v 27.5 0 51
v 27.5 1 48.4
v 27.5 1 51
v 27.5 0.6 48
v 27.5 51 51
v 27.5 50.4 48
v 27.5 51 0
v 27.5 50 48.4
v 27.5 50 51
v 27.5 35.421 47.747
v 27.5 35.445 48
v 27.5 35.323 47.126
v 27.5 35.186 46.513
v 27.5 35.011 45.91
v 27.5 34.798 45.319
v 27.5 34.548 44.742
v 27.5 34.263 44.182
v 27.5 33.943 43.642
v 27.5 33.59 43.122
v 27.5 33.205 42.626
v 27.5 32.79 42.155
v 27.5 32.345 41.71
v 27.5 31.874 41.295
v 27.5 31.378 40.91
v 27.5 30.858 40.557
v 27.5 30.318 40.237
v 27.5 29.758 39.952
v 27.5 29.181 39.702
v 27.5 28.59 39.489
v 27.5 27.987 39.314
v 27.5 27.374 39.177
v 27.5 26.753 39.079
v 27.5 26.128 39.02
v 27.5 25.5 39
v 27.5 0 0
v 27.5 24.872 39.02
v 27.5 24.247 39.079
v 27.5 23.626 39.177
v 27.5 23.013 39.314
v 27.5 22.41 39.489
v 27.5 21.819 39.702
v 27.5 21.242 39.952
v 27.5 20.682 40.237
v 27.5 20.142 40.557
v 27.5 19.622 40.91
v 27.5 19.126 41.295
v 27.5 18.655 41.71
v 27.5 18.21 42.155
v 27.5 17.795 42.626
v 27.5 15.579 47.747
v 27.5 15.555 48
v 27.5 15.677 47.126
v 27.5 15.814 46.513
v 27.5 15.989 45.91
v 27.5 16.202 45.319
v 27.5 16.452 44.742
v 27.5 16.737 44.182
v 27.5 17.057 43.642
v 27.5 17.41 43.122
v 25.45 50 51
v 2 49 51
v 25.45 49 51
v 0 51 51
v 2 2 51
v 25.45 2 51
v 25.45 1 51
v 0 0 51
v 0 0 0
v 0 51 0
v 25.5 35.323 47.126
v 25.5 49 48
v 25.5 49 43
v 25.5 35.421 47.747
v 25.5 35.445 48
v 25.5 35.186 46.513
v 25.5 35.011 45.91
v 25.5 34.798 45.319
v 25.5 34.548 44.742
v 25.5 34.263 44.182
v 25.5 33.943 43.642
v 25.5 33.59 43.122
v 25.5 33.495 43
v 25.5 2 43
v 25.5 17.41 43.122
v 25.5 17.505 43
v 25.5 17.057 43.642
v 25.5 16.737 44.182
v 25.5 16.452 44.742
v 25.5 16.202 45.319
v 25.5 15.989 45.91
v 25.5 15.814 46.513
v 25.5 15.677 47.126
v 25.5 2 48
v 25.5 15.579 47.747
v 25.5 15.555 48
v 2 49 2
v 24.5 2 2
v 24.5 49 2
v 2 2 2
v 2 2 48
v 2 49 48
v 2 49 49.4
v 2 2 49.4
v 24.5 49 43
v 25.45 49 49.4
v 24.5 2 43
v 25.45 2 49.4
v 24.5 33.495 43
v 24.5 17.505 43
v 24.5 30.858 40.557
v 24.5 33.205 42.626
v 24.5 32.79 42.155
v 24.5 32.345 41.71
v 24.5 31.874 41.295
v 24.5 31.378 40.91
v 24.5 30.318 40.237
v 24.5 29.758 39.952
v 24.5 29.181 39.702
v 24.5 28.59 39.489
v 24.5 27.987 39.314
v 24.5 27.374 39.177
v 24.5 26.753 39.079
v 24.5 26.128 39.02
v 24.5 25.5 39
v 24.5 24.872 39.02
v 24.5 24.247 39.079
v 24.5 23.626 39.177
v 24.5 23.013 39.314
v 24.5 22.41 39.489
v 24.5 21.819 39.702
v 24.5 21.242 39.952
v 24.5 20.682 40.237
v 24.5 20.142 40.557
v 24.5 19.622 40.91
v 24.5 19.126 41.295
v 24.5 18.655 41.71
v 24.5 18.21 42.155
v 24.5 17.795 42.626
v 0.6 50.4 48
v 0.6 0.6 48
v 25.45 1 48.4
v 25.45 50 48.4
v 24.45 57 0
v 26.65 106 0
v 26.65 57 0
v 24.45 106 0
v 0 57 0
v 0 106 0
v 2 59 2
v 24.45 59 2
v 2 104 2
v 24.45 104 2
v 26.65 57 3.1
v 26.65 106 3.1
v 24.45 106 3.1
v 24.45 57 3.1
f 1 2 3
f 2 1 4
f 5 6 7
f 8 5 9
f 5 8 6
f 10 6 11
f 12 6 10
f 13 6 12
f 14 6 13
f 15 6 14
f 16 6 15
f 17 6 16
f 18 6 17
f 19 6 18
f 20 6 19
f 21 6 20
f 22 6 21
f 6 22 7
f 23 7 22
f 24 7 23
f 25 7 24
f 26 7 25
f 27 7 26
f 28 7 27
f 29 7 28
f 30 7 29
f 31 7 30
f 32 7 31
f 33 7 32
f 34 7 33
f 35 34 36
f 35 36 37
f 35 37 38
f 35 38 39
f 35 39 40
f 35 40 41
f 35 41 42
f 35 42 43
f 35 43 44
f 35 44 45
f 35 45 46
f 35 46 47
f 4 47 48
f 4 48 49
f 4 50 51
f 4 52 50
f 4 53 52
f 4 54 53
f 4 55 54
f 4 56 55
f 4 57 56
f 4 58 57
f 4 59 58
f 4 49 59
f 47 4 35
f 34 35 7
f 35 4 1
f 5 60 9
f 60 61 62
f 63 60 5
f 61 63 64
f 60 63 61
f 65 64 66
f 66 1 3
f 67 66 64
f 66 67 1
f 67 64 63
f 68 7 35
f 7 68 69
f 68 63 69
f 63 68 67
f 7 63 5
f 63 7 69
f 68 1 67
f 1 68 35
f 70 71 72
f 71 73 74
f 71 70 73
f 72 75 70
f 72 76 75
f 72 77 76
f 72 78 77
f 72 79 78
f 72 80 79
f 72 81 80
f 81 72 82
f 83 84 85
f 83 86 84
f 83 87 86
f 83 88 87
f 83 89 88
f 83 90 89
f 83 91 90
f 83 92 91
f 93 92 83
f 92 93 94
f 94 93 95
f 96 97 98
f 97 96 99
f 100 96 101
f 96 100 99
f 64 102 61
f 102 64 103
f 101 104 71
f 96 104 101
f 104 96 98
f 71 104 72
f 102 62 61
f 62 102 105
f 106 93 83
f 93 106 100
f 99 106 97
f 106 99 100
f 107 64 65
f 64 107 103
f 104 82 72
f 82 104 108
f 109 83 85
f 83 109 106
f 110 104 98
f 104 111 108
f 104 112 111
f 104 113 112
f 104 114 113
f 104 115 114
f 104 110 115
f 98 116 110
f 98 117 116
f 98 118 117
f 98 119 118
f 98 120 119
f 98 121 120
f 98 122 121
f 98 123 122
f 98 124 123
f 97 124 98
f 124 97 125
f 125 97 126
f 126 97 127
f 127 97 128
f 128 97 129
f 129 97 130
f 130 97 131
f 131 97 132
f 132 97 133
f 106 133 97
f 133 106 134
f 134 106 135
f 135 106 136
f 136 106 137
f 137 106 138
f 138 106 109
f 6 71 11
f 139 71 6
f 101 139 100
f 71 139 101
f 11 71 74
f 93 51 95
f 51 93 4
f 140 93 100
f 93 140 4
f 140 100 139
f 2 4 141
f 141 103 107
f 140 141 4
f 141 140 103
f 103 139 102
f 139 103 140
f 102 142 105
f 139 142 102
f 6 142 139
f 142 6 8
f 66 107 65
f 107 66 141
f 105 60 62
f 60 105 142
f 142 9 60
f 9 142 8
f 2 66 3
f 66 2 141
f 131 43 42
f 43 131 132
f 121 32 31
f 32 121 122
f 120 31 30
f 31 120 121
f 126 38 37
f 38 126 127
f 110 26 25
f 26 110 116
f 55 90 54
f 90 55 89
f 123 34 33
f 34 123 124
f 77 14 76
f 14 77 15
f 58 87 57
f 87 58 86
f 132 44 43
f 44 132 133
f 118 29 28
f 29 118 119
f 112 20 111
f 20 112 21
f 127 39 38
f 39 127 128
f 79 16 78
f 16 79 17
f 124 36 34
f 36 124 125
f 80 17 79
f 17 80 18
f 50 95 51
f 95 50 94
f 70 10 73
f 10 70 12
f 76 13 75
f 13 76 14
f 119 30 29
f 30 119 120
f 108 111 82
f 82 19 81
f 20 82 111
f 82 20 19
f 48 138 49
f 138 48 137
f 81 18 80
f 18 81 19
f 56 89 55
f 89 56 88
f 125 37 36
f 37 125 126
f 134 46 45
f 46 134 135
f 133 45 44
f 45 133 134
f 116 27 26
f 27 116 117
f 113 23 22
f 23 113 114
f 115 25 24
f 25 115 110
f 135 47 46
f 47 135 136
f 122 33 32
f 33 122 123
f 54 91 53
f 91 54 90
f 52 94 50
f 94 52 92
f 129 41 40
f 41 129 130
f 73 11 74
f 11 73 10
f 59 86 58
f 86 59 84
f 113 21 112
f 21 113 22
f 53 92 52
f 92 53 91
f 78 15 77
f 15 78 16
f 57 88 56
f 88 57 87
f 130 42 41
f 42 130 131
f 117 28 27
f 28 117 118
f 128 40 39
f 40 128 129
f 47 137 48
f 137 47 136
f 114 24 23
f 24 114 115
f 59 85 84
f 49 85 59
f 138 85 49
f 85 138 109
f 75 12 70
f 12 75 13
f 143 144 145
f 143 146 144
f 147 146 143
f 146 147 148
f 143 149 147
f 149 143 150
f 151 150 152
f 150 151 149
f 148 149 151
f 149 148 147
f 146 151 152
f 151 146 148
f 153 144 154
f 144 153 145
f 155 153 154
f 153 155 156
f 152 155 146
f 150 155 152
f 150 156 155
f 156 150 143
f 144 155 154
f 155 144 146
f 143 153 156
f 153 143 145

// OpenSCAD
// file: carcassonne_box.scad
/**
 * @file carcassonne_box.scad
 * @author Conlan Wesson
 * Template for Carcossonne boxes.
 * @copyright Creative Commons Attribution-NonCommercial-ShareAlike 4.0
 */

mm = 1;
cm = 10*mm;

width = 47*mm;
thick = 2.5*mm;
wall = 2*mm;

/**
 * Lid for box.
 * @param count Number of cards.
 * @param columns Number of columns.
 * @param icon Path to icon DXF file.
 * @param rot Icon rotation in degrees.
 * @param mult Icon scale.
 * @param xoff X-offset of icon from center.
 * @param yoff Y-offset of icon from center.
 */
module carcassonne_lid(count, columns=1, icon=false, rot=0, mult=1, xoff=0, yoff=0, g=0){
	length = (thick * count) + ((width/2) - ((thick * count) % (width/2)));
	w = length+(1.5*wall)+.1;
	l = (width*columns)+wall;
	h = wall;
	d = 2;

	CubePoints = [
		[ 0-g, 0-g,   0 ],  //0
		[ w+g, 0-g,   0 ],  //1
		[ w+g, l+g,   0 ],  //2
		[ 0-g, l+g,   0 ],  //3
		[   d,   d, h+g ],  //4
		[   w,   d, h+g ],  //5
		[   w, l-d, h+g ],  //6
		[   d, l-d, h+g ]   //7
	];
	
	CubeFaces = [
		[0,1,2,3],  // bottom
		[4,5,1,0],  // front
		[7,6,5,4],  // top
		[5,6,2,1],  // right
		[6,7,3,2],  // back
		[7,4,0,3]   // left
	];
	
	
	difference(){
		union(){
			polyhedron( CubePoints, CubeFaces );
			translate([w-wall-.15,0,0]) cube([wall+.2,l, (1.5*wall)+.1]);
		}
		if(icon){
			translate([w/2+xoff,l/3+yoff,h-(wall/2)]){
				linear_extrude(height=(wall)+.1){
					rotate(rot) scale(mult) import(icon);
				}
			}
		}
	}
}

/**
 * Carcassonne card box.
 * @param count Number of cards.
 * @param dividers Array of divider positions.
 * @param columns Number of columns.
 */
module carcassonne_box(count, dividers=[], columns=1){
	length = (thick * count) + ((width/2) - ((thick * count) % (width/2)));
	difference(){
		union(){
			difference(){
				// Outer walls
				cube([length+(2*wall), (width*columns)+(2*wall), width+(2*wall)]);
				// Cavity
				translate([wall, wall, wall]){
					cube([length, width*columns, (width+wall)+.1]);
				}
			}
			// Dividers
			for(col = [0:columns-1]){
				for(div = dividers[col]){
					translate([(div*(width/2))+(wall/2), width*col+wall, 0]) cube([wall/2, width, width-(2*wall)]);
				}
				if(col > 0){
					translate([0, width*col+(wall/2), 0]) cube([length+(2*wall), wall/2, width-(2*wall)]);
				}
			}
		}
		union(){
			// Notch
			for(col = [0:columns-1]){
				translate([wall, wall+(width*col), wall]){
					translate([0, width/2, width])
					rotate([0, 90, 0]){
						cylinder(r=10, h=length+(2*wall), $fn=100);
					}
				}
			}
			// Track
			translate([wall/2,wall/2,width+wall/2]) carcassonne_lid(count, columns, g=0.4);
		}
	}
}
// main file
/**
 * @file cropcircles.scad
 * @author Conlan Wesson
 * The Crop Circles Carcossonne box.
 * @copyright Creative Commons Attribution-NonCommercial-ShareAlike 4.0
 */

include <carcassonne_box.scad>

count = 6;
dividers = [[1]];
columns = 1;

carcassonne_box(count, dividers, columns);
translate([0,width*columns+10,0]) carcassonne_lid(count, columns, icon="cropcircles.dxf", rot=0, mult=0.4, xoff=-5, yoff=-9);
